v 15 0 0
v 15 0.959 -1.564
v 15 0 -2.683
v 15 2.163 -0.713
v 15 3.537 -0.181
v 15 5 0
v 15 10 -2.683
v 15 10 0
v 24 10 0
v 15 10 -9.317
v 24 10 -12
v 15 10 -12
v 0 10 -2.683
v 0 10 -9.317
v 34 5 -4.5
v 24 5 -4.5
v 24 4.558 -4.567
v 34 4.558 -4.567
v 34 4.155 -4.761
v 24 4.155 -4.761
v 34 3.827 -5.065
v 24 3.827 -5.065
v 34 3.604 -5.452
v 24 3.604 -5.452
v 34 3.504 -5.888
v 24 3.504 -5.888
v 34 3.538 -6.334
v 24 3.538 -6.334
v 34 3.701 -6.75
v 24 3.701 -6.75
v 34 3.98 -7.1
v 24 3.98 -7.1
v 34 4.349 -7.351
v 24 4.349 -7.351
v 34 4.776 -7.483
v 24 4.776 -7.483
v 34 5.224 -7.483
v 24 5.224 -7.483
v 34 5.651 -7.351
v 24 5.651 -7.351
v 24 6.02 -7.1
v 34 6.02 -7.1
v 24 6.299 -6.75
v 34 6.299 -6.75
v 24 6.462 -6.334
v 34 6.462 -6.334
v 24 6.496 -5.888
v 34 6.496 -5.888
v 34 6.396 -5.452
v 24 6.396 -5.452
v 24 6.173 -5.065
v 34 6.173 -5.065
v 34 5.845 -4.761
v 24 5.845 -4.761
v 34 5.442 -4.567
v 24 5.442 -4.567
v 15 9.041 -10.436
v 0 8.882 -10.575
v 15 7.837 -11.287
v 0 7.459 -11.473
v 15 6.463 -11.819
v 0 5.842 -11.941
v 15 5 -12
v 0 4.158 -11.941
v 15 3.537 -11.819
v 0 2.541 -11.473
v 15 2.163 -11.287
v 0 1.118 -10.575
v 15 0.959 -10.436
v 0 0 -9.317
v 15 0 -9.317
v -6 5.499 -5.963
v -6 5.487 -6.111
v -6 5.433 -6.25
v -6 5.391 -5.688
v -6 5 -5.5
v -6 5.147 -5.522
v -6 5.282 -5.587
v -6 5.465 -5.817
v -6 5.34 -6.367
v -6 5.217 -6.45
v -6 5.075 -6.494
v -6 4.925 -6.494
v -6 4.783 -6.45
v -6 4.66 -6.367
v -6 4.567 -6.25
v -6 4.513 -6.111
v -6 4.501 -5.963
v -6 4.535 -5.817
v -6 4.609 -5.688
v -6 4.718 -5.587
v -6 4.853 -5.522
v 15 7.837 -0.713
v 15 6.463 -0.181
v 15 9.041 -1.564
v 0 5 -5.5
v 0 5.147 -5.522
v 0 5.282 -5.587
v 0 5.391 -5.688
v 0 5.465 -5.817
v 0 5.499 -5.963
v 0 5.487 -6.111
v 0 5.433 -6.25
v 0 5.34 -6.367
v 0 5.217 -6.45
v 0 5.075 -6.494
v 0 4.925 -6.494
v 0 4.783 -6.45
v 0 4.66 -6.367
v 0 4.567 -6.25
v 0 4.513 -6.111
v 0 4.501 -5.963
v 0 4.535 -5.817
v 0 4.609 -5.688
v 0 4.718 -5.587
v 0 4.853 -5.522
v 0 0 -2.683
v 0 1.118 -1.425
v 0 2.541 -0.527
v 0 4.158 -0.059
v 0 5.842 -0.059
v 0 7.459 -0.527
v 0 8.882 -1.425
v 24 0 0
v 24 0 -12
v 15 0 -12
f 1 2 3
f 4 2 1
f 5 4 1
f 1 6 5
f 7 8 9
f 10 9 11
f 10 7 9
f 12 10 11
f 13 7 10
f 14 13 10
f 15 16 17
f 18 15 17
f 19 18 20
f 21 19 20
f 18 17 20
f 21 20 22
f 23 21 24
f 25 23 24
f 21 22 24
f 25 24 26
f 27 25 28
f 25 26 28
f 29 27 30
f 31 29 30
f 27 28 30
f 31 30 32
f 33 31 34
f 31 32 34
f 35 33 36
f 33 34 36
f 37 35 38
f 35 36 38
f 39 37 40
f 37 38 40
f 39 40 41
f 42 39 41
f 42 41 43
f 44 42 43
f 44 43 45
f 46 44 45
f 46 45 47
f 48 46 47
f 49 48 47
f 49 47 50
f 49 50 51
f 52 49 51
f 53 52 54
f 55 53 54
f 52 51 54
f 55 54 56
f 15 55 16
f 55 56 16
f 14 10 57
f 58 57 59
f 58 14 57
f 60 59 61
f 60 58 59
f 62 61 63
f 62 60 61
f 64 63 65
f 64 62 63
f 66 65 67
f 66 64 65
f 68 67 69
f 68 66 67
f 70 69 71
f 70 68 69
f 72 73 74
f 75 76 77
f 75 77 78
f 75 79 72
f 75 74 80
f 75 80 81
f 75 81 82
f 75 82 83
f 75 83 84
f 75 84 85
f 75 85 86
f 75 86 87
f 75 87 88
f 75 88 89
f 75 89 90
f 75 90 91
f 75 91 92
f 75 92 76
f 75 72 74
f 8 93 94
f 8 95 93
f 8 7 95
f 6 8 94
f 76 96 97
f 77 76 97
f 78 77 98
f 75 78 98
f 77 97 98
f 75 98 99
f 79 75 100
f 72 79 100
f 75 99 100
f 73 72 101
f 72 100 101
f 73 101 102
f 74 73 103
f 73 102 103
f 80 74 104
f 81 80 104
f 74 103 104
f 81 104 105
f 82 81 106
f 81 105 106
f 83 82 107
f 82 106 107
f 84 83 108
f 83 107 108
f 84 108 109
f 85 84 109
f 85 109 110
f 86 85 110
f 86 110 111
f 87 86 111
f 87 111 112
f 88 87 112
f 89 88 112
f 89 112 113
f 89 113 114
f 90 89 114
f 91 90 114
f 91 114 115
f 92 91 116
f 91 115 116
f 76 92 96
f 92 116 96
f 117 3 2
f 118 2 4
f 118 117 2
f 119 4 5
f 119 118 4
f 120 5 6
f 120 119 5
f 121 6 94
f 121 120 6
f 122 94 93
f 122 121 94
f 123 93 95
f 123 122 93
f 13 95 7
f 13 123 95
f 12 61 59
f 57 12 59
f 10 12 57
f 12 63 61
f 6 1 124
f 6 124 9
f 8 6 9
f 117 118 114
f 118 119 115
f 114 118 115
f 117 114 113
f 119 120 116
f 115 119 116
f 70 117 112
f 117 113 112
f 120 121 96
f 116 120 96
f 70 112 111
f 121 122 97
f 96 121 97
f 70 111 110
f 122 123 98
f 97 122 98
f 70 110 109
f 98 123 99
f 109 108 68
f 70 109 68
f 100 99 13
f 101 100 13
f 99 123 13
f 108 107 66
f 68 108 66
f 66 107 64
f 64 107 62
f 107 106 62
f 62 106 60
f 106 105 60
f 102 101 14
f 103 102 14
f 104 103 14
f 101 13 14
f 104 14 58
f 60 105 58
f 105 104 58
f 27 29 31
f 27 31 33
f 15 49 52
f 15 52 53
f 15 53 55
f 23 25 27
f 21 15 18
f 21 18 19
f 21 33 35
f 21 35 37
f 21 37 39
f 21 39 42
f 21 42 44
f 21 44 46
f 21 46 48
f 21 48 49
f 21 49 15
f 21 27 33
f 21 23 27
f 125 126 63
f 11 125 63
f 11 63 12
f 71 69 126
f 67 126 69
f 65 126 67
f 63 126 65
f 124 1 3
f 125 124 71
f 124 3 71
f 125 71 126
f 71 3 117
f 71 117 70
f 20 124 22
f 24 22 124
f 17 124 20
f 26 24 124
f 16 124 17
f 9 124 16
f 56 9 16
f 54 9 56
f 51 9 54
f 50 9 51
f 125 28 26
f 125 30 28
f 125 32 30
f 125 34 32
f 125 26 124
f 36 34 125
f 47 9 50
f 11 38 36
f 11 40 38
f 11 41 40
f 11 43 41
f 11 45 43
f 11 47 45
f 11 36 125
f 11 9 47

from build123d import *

# Parameters (mm, degrees)
SKETCH2_W           = 12
SKETCH2_H           = 10
BOSS_EXTRUDE1_DEPTH = 24
SKETCH3_R           = 1.5
BOSS_EXTRUDE2_DEPTH = 10
SKETCH4_OUTSIDE_W   = 21.484
SKETCH4_OUTSIDE_H   = 19.484
SKETCH4_OUTSIDE_R   = 6
CUT_EXTRUDE1_DEPTH  = 15
SKETCH5_R           = 0.5
BOSS_EXTRUDE3_DEPTH = 6


with BuildPart() as part:
    # Sketch2 → Boss-Extrude1 (new body)
    with BuildSketch(Plane(origin=(0, 0, 0), x_dir=(0, 0, -1), z_dir=(1, 0, 0))):
        with Locations((6, 5)):
            Rectangle(SKETCH2_W, SKETCH2_H)
    extrude(amount=BOSS_EXTRUDE1_DEPTH)

    # Sketch3 → Boss-Extrude2 (add)
    with BuildSketch(Plane(origin=(24, 0, 0), x_dir=(0, 0, -1), z_dir=(1, 0, 0))):
        with Locations((6, 5)):
            Circle(SKETCH3_R)
    extrude(amount=BOSS_EXTRUDE2_DEPTH)

    # Sketch4 outside → Cut-Extrude1 (cut)
    with BuildSketch(Plane.ZY):
        with Locations((-6, 5)):
            Rectangle(SKETCH4_OUTSIDE_W, SKETCH4_OUTSIDE_H)
        with Locations((-6, 5)):
            Circle(SKETCH4_OUTSIDE_R, mode=Mode.SUBTRACT)
    extrude(amount=-CUT_EXTRUDE1_DEPTH, mode=Mode.SUBTRACT)

    # Sketch5 → Boss-Extrude3 (add)
    with BuildSketch(Plane.ZY):
        with Locations((-6, 5)):
            Circle(SKETCH5_R)
    extrude(amount=BOSS_EXTRUDE3_DEPTH)


solid = part.part
